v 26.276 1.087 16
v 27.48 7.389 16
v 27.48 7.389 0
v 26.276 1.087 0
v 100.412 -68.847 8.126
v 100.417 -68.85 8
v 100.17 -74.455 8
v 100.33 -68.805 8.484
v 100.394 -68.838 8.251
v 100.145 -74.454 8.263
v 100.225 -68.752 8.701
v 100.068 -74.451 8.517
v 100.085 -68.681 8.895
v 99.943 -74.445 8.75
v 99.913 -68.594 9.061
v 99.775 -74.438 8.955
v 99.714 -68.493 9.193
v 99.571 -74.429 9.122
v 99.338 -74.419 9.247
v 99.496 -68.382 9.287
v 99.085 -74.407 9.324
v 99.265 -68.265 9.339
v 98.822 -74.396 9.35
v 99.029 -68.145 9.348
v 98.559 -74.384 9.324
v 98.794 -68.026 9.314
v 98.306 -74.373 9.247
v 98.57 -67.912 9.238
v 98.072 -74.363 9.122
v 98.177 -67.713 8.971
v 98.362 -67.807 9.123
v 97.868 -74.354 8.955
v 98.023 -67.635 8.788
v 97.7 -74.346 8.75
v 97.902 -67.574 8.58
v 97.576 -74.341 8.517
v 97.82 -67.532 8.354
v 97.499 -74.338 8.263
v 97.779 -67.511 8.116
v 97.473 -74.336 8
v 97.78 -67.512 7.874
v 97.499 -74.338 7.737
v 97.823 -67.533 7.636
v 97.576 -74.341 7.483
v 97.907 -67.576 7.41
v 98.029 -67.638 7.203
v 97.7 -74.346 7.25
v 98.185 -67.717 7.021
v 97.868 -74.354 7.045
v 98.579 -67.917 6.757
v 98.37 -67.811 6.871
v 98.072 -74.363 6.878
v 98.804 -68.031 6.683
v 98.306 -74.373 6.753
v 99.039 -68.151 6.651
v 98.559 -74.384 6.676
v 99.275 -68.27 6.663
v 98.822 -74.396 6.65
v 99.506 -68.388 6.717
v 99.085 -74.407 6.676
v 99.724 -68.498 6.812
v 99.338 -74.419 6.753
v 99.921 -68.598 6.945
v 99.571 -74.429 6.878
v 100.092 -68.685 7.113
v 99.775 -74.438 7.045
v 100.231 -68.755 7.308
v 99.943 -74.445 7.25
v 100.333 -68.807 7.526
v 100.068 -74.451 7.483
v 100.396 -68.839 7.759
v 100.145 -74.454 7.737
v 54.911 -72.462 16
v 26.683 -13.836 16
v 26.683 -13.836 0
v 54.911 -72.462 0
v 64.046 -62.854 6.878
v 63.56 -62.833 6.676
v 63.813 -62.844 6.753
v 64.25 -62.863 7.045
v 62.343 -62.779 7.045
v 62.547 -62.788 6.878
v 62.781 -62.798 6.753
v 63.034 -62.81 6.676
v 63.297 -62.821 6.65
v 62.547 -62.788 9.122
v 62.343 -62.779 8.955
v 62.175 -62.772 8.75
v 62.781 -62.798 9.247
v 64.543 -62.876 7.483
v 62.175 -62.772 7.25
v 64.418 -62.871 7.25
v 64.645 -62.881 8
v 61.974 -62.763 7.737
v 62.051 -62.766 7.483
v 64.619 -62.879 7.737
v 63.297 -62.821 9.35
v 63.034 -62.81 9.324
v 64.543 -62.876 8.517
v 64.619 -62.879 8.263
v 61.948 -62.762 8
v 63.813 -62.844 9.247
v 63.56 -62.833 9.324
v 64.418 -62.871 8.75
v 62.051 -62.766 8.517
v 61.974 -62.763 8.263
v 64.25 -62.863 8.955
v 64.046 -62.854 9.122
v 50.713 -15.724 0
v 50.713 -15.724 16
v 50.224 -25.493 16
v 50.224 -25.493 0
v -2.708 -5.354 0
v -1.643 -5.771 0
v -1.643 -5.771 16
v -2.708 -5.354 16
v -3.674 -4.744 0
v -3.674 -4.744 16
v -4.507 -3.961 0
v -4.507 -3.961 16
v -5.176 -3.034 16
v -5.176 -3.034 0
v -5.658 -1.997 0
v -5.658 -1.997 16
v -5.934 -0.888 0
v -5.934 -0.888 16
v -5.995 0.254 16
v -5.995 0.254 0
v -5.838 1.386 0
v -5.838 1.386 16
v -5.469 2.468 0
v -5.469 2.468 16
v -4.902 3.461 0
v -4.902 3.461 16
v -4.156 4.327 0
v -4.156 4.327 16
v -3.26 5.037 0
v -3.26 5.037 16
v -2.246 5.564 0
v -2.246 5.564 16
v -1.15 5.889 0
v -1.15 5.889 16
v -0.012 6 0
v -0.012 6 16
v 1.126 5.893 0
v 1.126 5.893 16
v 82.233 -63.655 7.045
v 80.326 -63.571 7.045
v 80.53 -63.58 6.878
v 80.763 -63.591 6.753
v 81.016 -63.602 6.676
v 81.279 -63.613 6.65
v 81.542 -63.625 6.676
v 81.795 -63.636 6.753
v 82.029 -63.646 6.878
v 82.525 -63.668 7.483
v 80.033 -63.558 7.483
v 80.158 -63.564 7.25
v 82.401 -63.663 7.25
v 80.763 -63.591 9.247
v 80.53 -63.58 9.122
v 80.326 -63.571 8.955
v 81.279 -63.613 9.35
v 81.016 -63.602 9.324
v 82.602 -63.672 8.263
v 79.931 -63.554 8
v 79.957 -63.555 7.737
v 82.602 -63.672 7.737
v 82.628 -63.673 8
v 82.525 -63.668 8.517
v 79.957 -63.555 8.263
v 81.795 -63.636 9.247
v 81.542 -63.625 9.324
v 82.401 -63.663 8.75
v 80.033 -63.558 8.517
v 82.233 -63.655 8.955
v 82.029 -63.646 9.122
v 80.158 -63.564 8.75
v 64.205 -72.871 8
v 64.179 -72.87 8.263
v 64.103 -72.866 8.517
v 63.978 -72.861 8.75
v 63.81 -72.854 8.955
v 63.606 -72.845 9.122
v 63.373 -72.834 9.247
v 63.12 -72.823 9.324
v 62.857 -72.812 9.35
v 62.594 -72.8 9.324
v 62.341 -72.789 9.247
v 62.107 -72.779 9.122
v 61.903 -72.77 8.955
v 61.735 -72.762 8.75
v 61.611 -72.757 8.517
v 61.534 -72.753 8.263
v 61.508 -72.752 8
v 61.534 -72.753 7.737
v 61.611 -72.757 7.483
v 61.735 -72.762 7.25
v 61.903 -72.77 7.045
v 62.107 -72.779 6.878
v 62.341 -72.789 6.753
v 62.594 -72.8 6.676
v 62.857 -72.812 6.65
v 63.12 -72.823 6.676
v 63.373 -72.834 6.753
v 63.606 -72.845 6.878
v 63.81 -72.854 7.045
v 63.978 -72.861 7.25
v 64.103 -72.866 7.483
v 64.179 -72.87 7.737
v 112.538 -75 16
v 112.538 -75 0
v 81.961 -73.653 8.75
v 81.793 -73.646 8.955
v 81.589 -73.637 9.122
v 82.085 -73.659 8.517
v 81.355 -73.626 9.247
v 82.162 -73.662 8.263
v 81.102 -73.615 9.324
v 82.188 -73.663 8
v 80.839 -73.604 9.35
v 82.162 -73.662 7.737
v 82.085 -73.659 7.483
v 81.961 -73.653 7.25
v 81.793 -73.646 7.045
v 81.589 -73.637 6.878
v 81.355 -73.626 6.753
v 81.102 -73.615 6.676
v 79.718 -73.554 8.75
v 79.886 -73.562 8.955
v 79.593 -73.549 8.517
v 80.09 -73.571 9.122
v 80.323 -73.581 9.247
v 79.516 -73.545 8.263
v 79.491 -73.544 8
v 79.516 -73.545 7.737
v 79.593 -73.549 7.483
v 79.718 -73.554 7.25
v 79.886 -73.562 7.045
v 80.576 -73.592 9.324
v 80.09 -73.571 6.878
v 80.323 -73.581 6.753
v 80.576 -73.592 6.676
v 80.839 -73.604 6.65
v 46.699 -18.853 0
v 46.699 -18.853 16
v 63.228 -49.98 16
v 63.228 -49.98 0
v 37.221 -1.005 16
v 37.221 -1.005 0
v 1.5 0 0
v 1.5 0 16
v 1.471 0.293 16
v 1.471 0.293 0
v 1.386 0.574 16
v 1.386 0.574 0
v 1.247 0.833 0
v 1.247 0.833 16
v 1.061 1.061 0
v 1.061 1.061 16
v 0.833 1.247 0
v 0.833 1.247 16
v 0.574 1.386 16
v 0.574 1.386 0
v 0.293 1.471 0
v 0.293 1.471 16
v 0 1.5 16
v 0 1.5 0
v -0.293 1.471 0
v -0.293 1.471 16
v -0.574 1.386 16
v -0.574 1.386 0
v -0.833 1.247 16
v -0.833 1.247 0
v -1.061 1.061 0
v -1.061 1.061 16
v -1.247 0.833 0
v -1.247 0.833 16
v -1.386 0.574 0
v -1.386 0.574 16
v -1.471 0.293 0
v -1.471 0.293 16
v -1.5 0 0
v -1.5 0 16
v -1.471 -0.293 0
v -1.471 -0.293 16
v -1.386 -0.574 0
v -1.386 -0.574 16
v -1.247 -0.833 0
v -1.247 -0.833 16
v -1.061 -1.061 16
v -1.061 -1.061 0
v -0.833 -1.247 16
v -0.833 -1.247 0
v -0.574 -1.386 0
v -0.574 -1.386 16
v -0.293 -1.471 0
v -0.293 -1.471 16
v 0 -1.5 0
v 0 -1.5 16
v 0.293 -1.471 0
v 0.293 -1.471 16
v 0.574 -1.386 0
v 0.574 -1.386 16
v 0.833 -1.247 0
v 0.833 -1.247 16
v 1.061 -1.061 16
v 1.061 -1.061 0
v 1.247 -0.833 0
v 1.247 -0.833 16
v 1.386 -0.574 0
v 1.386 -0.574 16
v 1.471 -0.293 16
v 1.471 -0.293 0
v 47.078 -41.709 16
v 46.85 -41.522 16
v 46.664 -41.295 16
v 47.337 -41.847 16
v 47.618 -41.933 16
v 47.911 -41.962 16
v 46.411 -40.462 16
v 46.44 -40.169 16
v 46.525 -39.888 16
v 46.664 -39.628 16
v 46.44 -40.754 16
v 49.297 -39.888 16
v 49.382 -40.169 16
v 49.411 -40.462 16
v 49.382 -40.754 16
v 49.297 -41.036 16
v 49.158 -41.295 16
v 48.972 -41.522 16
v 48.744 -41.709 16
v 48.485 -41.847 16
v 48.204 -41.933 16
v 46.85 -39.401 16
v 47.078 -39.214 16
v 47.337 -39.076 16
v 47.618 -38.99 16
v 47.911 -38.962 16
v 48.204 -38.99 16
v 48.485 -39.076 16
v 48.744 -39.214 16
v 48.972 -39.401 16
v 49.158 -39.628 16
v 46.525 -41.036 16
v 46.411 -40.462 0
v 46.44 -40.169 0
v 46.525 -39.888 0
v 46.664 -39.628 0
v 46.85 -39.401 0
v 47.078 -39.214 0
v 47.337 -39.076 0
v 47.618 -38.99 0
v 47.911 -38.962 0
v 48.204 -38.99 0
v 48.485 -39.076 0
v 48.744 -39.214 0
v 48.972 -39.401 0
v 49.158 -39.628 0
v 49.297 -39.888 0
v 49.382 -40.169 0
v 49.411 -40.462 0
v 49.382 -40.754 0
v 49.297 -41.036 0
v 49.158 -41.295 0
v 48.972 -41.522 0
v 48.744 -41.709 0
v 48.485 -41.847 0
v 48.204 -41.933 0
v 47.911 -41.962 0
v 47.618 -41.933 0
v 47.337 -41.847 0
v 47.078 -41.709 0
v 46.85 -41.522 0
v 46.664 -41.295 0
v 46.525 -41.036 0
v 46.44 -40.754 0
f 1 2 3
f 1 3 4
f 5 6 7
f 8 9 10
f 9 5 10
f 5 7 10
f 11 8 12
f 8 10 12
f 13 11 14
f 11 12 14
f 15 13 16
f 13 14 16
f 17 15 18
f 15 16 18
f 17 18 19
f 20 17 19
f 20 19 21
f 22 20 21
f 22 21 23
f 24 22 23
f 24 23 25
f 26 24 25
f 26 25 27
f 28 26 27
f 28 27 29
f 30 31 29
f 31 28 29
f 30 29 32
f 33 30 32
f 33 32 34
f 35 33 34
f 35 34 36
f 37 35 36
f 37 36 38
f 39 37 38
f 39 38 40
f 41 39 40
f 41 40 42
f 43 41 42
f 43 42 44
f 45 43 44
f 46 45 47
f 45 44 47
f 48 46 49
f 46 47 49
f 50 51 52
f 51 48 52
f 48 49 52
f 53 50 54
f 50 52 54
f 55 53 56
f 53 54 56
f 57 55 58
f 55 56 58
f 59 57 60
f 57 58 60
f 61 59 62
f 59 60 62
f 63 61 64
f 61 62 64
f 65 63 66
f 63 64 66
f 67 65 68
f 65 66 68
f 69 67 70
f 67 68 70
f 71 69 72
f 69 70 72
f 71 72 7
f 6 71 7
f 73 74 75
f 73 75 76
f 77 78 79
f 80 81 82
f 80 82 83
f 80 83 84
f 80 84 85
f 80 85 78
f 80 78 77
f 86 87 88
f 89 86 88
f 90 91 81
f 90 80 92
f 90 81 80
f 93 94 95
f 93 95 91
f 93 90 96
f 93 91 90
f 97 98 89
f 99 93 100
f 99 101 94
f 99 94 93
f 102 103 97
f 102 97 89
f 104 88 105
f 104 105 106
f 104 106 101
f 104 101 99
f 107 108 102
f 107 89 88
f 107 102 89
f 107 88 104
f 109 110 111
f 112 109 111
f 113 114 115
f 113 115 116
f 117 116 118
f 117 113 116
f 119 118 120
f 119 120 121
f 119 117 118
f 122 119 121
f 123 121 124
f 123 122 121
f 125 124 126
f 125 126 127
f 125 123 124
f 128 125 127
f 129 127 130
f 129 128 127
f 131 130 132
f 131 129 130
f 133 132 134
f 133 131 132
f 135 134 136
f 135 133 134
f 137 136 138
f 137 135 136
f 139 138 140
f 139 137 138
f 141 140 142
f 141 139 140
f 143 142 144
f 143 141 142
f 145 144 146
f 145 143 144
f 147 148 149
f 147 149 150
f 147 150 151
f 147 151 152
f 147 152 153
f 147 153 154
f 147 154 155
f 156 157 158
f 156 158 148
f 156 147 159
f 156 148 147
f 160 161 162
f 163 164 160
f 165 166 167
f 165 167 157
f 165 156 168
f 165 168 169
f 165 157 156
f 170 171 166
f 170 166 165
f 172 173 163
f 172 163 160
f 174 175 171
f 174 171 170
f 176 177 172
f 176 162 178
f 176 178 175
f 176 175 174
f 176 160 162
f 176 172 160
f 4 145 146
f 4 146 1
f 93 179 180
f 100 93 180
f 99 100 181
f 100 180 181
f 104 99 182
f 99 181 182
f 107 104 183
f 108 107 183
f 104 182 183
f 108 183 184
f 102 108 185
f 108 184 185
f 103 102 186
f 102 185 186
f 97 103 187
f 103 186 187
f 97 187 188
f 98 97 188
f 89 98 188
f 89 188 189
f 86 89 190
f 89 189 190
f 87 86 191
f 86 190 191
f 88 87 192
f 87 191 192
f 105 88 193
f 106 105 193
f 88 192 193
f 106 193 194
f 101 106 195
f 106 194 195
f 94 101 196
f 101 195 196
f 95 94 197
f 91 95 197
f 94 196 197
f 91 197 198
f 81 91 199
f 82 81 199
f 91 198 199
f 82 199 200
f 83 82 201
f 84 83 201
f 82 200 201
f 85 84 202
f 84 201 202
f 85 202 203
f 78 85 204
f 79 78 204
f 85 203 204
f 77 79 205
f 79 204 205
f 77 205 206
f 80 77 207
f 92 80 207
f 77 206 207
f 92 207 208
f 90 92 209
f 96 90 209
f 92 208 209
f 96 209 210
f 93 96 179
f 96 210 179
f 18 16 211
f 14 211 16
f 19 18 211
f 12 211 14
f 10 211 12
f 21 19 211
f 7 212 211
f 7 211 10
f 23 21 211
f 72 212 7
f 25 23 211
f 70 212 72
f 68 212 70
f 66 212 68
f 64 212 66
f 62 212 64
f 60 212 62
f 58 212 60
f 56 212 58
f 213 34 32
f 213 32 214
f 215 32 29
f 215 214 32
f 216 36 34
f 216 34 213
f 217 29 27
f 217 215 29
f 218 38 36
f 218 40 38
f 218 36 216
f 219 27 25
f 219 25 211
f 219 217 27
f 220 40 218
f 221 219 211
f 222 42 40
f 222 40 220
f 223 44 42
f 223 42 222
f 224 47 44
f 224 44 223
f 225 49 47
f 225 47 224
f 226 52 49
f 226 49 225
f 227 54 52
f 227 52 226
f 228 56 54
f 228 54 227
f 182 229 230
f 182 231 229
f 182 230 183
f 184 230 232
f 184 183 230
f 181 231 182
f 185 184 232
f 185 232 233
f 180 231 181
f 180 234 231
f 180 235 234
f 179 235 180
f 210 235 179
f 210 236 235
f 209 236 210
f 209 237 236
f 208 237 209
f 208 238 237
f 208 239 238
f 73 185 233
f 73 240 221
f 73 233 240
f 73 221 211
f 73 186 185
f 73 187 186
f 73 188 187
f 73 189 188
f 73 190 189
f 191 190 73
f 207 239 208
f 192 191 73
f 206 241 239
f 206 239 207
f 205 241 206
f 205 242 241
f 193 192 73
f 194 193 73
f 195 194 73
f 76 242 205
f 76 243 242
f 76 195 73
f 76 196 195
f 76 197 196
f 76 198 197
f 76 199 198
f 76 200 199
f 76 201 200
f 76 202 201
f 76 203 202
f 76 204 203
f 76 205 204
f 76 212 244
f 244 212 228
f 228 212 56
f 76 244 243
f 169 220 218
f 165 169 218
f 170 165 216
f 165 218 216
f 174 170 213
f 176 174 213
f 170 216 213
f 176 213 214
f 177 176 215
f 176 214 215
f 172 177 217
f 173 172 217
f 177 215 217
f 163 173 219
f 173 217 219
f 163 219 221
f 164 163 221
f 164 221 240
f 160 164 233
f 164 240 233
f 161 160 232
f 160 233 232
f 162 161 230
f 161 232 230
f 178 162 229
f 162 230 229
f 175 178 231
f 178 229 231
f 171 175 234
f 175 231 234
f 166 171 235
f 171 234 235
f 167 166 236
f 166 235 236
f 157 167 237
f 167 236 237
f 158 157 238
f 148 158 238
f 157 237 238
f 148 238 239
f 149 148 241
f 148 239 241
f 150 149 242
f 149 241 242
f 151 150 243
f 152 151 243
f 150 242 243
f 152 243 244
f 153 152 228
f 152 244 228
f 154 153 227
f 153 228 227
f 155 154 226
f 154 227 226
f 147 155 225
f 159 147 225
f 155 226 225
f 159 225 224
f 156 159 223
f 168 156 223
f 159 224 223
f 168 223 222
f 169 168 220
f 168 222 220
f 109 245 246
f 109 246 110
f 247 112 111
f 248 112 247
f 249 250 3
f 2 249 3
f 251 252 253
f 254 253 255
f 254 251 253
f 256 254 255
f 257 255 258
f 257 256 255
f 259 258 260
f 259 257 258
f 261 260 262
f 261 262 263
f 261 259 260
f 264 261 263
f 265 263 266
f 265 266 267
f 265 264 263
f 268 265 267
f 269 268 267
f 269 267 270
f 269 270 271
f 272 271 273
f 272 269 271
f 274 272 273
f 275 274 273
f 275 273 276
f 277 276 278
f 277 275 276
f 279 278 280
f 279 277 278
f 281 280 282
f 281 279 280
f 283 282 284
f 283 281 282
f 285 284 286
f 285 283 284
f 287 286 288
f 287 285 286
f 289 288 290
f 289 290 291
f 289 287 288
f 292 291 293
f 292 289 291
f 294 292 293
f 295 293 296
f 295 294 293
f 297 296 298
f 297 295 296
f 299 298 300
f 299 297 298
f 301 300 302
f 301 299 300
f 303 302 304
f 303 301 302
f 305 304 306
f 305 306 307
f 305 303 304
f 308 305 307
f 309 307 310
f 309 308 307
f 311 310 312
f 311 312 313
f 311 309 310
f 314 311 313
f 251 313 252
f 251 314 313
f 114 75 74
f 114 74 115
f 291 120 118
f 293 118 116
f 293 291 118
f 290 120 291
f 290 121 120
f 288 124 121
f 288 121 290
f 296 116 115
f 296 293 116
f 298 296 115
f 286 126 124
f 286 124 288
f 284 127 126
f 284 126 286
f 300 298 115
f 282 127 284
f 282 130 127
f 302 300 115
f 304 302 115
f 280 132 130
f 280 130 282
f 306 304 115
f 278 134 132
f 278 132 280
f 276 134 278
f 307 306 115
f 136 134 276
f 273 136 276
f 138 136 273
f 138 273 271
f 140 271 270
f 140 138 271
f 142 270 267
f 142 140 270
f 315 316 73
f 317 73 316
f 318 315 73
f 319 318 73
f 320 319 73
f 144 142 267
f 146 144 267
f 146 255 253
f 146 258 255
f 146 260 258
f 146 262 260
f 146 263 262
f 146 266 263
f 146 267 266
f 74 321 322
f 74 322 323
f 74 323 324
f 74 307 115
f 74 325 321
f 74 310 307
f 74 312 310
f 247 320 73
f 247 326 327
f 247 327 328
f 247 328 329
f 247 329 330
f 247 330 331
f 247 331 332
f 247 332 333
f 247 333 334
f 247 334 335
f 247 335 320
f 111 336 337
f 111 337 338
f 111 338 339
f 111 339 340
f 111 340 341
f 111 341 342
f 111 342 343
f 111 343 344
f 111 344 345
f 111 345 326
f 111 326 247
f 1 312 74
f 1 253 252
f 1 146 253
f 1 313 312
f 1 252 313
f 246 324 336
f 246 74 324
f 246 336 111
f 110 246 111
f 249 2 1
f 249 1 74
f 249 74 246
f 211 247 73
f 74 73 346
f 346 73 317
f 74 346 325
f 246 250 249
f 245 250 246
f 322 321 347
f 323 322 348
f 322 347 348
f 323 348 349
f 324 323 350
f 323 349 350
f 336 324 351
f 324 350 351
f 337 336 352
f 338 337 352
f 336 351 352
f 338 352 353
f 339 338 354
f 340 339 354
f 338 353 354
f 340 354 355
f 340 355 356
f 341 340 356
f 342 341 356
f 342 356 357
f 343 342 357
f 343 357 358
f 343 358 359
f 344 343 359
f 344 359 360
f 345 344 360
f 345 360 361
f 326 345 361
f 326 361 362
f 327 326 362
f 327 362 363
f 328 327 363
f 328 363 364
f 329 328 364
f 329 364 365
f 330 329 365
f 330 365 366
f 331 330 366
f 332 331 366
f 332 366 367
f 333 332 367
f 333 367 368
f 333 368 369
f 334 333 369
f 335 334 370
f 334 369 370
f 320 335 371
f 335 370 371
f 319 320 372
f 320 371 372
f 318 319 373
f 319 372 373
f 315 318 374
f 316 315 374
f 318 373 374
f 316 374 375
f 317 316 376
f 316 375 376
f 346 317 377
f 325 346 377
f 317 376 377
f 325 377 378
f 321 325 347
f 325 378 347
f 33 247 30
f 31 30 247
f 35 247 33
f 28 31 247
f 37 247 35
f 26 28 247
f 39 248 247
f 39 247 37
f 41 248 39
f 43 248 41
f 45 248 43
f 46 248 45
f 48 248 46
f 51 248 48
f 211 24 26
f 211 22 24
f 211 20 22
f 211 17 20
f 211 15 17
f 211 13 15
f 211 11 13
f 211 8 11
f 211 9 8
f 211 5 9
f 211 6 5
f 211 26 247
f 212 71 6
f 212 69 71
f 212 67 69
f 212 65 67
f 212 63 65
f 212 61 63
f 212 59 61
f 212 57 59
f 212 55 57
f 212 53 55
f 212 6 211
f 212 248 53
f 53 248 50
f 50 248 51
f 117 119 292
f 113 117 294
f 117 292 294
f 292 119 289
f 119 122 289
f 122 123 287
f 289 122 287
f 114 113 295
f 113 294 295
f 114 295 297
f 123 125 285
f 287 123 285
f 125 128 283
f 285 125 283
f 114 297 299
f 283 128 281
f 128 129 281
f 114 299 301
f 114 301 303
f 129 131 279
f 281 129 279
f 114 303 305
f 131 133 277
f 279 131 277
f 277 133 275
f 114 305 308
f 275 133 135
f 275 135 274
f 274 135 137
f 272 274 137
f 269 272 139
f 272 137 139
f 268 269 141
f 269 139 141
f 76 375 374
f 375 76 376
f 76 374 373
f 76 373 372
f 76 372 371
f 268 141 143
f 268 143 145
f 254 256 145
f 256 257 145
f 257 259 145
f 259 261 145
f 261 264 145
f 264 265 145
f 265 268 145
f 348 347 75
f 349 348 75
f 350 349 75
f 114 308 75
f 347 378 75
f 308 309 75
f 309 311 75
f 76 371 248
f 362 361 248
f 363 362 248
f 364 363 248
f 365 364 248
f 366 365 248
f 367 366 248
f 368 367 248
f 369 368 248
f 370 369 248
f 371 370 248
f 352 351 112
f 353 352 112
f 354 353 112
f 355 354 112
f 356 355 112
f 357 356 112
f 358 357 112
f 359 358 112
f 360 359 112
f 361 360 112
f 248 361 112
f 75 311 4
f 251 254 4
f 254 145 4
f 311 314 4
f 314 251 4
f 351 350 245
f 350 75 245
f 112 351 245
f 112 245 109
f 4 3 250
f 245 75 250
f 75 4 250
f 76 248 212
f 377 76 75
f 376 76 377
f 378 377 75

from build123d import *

# Parameters (mm, degrees)
SKETCH_1_R          = 1.5
EXTRUDE_1_DEPTH     = 16
SKETCH_2_R          = 1.35
CUT_EXTRUDE_1_DEPTH = 10
CUT_EXTRUDE_2_DEPTH = 33
EXTRUDE_3_DEPTH     = 16
SKETCH_6_R          = 1.5
CUT_EXTRUDE_3_DEPTH = 48
EXTRUDE_4_DEPTH     = 16


with BuildPart() as part:
    # 草图1 → 凸台-拉伸1 (new body)
    with BuildSketch(Plane.XY):
        with BuildLine():
            Line((1.126380295, 5.893323971), (37.220974686, -1.005370225))
            Line((37.220974686, -1.005370225), (63.227984205, -49.979924472))
            Line((63.227984205, -49.979924472), (112.538061605, -75))
            Line((112.538061605, -75), (53.330616959, -72.391905084))
            Line((53.330616959, -72.391905084), (49.915441771, -64.88738307))
            Line((49.915441771, -64.88738307), (26.682733599, -13.835720919))
            Line((26.682733599, -13.835720919), (-1.643050648, -5.77064854))
            ThreePointArc((-1.643050648, -5.77064854), (-5.837705093, 1.386073321), (1.126380295, 5.893323971))
        make_face()
        Circle(SKETCH_1_R, mode=Mode.SUBTRACT)
    extrude(amount=EXTRUDE_1_DEPTH)

    # 草图2 → 切除-拉伸1 (cut)
    with BuildSketch(Plane(origin=(-3.079413203, -69.907036606, 0), x_dir=(0.9990312032291818, -0.044007442262116094, 0), z_dir=(-0.044007442262116094, -0.9990312032291818, 0))):
        with Locations((66, 8)):
            Circle(SKETCH_2_R)
        with Locations((102, 8)):
            Circle(SKETCH_2_R)
        with Locations((84, 8)):
            Circle(SKETCH_2_R)
    extrude(amount=-CUT_EXTRUDE_1_DEPTH, mode=Mode.SUBTRACT)

    # 草图3 → 切除-拉伸2 (cut)
    with BuildSketch(Plane.XY.offset(16)):
        Polygon((26.682733599, -13.835720919), (54.911117554, -72.461526322), (53.330616959, -72.391905084), align=None)
    extrude(amount=-CUT_EXTRUDE_2_DEPTH, mode=Mode.SUBTRACT)

    # 草图5 → 凸台-拉伸3 (add)
    with BuildSketch(Plane(origin=(0, 0, 0), x_dir=(-1, 0, 0), z_dir=(0, 0, -1))):
        Polygon((-37.220974686, -1.005370225), (-27.480137518, 7.389214918), (-26.275532527, 1.086612233), align=None)
    extrude(amount=-EXTRUDE_3_DEPTH)

    # 草图6 → 切除-拉伸3 (cut)
    with BuildSketch(Plane(origin=(0, 0, 0), x_dir=(-1, 0, 0), z_dir=(0, 0, -1))):
        with Locations((-47.911117554, -40.461526322)):
            Circle(SKETCH_6_R)
    extrude(amount=-CUT_EXTRUDE_3_DEPTH, mode=Mode.SUBTRACT)

    # 草图7 → 凸台-拉伸4 (add)
    with BuildSketch(Plane.XY.offset(16)):
        Polygon((46.698574744, -18.852913898), (50.712719625, -15.723743191), (50.224479445, -25.492647349), align=None)
    extrude(amount=-EXTRUDE_4_DEPTH)


solid = part.part
